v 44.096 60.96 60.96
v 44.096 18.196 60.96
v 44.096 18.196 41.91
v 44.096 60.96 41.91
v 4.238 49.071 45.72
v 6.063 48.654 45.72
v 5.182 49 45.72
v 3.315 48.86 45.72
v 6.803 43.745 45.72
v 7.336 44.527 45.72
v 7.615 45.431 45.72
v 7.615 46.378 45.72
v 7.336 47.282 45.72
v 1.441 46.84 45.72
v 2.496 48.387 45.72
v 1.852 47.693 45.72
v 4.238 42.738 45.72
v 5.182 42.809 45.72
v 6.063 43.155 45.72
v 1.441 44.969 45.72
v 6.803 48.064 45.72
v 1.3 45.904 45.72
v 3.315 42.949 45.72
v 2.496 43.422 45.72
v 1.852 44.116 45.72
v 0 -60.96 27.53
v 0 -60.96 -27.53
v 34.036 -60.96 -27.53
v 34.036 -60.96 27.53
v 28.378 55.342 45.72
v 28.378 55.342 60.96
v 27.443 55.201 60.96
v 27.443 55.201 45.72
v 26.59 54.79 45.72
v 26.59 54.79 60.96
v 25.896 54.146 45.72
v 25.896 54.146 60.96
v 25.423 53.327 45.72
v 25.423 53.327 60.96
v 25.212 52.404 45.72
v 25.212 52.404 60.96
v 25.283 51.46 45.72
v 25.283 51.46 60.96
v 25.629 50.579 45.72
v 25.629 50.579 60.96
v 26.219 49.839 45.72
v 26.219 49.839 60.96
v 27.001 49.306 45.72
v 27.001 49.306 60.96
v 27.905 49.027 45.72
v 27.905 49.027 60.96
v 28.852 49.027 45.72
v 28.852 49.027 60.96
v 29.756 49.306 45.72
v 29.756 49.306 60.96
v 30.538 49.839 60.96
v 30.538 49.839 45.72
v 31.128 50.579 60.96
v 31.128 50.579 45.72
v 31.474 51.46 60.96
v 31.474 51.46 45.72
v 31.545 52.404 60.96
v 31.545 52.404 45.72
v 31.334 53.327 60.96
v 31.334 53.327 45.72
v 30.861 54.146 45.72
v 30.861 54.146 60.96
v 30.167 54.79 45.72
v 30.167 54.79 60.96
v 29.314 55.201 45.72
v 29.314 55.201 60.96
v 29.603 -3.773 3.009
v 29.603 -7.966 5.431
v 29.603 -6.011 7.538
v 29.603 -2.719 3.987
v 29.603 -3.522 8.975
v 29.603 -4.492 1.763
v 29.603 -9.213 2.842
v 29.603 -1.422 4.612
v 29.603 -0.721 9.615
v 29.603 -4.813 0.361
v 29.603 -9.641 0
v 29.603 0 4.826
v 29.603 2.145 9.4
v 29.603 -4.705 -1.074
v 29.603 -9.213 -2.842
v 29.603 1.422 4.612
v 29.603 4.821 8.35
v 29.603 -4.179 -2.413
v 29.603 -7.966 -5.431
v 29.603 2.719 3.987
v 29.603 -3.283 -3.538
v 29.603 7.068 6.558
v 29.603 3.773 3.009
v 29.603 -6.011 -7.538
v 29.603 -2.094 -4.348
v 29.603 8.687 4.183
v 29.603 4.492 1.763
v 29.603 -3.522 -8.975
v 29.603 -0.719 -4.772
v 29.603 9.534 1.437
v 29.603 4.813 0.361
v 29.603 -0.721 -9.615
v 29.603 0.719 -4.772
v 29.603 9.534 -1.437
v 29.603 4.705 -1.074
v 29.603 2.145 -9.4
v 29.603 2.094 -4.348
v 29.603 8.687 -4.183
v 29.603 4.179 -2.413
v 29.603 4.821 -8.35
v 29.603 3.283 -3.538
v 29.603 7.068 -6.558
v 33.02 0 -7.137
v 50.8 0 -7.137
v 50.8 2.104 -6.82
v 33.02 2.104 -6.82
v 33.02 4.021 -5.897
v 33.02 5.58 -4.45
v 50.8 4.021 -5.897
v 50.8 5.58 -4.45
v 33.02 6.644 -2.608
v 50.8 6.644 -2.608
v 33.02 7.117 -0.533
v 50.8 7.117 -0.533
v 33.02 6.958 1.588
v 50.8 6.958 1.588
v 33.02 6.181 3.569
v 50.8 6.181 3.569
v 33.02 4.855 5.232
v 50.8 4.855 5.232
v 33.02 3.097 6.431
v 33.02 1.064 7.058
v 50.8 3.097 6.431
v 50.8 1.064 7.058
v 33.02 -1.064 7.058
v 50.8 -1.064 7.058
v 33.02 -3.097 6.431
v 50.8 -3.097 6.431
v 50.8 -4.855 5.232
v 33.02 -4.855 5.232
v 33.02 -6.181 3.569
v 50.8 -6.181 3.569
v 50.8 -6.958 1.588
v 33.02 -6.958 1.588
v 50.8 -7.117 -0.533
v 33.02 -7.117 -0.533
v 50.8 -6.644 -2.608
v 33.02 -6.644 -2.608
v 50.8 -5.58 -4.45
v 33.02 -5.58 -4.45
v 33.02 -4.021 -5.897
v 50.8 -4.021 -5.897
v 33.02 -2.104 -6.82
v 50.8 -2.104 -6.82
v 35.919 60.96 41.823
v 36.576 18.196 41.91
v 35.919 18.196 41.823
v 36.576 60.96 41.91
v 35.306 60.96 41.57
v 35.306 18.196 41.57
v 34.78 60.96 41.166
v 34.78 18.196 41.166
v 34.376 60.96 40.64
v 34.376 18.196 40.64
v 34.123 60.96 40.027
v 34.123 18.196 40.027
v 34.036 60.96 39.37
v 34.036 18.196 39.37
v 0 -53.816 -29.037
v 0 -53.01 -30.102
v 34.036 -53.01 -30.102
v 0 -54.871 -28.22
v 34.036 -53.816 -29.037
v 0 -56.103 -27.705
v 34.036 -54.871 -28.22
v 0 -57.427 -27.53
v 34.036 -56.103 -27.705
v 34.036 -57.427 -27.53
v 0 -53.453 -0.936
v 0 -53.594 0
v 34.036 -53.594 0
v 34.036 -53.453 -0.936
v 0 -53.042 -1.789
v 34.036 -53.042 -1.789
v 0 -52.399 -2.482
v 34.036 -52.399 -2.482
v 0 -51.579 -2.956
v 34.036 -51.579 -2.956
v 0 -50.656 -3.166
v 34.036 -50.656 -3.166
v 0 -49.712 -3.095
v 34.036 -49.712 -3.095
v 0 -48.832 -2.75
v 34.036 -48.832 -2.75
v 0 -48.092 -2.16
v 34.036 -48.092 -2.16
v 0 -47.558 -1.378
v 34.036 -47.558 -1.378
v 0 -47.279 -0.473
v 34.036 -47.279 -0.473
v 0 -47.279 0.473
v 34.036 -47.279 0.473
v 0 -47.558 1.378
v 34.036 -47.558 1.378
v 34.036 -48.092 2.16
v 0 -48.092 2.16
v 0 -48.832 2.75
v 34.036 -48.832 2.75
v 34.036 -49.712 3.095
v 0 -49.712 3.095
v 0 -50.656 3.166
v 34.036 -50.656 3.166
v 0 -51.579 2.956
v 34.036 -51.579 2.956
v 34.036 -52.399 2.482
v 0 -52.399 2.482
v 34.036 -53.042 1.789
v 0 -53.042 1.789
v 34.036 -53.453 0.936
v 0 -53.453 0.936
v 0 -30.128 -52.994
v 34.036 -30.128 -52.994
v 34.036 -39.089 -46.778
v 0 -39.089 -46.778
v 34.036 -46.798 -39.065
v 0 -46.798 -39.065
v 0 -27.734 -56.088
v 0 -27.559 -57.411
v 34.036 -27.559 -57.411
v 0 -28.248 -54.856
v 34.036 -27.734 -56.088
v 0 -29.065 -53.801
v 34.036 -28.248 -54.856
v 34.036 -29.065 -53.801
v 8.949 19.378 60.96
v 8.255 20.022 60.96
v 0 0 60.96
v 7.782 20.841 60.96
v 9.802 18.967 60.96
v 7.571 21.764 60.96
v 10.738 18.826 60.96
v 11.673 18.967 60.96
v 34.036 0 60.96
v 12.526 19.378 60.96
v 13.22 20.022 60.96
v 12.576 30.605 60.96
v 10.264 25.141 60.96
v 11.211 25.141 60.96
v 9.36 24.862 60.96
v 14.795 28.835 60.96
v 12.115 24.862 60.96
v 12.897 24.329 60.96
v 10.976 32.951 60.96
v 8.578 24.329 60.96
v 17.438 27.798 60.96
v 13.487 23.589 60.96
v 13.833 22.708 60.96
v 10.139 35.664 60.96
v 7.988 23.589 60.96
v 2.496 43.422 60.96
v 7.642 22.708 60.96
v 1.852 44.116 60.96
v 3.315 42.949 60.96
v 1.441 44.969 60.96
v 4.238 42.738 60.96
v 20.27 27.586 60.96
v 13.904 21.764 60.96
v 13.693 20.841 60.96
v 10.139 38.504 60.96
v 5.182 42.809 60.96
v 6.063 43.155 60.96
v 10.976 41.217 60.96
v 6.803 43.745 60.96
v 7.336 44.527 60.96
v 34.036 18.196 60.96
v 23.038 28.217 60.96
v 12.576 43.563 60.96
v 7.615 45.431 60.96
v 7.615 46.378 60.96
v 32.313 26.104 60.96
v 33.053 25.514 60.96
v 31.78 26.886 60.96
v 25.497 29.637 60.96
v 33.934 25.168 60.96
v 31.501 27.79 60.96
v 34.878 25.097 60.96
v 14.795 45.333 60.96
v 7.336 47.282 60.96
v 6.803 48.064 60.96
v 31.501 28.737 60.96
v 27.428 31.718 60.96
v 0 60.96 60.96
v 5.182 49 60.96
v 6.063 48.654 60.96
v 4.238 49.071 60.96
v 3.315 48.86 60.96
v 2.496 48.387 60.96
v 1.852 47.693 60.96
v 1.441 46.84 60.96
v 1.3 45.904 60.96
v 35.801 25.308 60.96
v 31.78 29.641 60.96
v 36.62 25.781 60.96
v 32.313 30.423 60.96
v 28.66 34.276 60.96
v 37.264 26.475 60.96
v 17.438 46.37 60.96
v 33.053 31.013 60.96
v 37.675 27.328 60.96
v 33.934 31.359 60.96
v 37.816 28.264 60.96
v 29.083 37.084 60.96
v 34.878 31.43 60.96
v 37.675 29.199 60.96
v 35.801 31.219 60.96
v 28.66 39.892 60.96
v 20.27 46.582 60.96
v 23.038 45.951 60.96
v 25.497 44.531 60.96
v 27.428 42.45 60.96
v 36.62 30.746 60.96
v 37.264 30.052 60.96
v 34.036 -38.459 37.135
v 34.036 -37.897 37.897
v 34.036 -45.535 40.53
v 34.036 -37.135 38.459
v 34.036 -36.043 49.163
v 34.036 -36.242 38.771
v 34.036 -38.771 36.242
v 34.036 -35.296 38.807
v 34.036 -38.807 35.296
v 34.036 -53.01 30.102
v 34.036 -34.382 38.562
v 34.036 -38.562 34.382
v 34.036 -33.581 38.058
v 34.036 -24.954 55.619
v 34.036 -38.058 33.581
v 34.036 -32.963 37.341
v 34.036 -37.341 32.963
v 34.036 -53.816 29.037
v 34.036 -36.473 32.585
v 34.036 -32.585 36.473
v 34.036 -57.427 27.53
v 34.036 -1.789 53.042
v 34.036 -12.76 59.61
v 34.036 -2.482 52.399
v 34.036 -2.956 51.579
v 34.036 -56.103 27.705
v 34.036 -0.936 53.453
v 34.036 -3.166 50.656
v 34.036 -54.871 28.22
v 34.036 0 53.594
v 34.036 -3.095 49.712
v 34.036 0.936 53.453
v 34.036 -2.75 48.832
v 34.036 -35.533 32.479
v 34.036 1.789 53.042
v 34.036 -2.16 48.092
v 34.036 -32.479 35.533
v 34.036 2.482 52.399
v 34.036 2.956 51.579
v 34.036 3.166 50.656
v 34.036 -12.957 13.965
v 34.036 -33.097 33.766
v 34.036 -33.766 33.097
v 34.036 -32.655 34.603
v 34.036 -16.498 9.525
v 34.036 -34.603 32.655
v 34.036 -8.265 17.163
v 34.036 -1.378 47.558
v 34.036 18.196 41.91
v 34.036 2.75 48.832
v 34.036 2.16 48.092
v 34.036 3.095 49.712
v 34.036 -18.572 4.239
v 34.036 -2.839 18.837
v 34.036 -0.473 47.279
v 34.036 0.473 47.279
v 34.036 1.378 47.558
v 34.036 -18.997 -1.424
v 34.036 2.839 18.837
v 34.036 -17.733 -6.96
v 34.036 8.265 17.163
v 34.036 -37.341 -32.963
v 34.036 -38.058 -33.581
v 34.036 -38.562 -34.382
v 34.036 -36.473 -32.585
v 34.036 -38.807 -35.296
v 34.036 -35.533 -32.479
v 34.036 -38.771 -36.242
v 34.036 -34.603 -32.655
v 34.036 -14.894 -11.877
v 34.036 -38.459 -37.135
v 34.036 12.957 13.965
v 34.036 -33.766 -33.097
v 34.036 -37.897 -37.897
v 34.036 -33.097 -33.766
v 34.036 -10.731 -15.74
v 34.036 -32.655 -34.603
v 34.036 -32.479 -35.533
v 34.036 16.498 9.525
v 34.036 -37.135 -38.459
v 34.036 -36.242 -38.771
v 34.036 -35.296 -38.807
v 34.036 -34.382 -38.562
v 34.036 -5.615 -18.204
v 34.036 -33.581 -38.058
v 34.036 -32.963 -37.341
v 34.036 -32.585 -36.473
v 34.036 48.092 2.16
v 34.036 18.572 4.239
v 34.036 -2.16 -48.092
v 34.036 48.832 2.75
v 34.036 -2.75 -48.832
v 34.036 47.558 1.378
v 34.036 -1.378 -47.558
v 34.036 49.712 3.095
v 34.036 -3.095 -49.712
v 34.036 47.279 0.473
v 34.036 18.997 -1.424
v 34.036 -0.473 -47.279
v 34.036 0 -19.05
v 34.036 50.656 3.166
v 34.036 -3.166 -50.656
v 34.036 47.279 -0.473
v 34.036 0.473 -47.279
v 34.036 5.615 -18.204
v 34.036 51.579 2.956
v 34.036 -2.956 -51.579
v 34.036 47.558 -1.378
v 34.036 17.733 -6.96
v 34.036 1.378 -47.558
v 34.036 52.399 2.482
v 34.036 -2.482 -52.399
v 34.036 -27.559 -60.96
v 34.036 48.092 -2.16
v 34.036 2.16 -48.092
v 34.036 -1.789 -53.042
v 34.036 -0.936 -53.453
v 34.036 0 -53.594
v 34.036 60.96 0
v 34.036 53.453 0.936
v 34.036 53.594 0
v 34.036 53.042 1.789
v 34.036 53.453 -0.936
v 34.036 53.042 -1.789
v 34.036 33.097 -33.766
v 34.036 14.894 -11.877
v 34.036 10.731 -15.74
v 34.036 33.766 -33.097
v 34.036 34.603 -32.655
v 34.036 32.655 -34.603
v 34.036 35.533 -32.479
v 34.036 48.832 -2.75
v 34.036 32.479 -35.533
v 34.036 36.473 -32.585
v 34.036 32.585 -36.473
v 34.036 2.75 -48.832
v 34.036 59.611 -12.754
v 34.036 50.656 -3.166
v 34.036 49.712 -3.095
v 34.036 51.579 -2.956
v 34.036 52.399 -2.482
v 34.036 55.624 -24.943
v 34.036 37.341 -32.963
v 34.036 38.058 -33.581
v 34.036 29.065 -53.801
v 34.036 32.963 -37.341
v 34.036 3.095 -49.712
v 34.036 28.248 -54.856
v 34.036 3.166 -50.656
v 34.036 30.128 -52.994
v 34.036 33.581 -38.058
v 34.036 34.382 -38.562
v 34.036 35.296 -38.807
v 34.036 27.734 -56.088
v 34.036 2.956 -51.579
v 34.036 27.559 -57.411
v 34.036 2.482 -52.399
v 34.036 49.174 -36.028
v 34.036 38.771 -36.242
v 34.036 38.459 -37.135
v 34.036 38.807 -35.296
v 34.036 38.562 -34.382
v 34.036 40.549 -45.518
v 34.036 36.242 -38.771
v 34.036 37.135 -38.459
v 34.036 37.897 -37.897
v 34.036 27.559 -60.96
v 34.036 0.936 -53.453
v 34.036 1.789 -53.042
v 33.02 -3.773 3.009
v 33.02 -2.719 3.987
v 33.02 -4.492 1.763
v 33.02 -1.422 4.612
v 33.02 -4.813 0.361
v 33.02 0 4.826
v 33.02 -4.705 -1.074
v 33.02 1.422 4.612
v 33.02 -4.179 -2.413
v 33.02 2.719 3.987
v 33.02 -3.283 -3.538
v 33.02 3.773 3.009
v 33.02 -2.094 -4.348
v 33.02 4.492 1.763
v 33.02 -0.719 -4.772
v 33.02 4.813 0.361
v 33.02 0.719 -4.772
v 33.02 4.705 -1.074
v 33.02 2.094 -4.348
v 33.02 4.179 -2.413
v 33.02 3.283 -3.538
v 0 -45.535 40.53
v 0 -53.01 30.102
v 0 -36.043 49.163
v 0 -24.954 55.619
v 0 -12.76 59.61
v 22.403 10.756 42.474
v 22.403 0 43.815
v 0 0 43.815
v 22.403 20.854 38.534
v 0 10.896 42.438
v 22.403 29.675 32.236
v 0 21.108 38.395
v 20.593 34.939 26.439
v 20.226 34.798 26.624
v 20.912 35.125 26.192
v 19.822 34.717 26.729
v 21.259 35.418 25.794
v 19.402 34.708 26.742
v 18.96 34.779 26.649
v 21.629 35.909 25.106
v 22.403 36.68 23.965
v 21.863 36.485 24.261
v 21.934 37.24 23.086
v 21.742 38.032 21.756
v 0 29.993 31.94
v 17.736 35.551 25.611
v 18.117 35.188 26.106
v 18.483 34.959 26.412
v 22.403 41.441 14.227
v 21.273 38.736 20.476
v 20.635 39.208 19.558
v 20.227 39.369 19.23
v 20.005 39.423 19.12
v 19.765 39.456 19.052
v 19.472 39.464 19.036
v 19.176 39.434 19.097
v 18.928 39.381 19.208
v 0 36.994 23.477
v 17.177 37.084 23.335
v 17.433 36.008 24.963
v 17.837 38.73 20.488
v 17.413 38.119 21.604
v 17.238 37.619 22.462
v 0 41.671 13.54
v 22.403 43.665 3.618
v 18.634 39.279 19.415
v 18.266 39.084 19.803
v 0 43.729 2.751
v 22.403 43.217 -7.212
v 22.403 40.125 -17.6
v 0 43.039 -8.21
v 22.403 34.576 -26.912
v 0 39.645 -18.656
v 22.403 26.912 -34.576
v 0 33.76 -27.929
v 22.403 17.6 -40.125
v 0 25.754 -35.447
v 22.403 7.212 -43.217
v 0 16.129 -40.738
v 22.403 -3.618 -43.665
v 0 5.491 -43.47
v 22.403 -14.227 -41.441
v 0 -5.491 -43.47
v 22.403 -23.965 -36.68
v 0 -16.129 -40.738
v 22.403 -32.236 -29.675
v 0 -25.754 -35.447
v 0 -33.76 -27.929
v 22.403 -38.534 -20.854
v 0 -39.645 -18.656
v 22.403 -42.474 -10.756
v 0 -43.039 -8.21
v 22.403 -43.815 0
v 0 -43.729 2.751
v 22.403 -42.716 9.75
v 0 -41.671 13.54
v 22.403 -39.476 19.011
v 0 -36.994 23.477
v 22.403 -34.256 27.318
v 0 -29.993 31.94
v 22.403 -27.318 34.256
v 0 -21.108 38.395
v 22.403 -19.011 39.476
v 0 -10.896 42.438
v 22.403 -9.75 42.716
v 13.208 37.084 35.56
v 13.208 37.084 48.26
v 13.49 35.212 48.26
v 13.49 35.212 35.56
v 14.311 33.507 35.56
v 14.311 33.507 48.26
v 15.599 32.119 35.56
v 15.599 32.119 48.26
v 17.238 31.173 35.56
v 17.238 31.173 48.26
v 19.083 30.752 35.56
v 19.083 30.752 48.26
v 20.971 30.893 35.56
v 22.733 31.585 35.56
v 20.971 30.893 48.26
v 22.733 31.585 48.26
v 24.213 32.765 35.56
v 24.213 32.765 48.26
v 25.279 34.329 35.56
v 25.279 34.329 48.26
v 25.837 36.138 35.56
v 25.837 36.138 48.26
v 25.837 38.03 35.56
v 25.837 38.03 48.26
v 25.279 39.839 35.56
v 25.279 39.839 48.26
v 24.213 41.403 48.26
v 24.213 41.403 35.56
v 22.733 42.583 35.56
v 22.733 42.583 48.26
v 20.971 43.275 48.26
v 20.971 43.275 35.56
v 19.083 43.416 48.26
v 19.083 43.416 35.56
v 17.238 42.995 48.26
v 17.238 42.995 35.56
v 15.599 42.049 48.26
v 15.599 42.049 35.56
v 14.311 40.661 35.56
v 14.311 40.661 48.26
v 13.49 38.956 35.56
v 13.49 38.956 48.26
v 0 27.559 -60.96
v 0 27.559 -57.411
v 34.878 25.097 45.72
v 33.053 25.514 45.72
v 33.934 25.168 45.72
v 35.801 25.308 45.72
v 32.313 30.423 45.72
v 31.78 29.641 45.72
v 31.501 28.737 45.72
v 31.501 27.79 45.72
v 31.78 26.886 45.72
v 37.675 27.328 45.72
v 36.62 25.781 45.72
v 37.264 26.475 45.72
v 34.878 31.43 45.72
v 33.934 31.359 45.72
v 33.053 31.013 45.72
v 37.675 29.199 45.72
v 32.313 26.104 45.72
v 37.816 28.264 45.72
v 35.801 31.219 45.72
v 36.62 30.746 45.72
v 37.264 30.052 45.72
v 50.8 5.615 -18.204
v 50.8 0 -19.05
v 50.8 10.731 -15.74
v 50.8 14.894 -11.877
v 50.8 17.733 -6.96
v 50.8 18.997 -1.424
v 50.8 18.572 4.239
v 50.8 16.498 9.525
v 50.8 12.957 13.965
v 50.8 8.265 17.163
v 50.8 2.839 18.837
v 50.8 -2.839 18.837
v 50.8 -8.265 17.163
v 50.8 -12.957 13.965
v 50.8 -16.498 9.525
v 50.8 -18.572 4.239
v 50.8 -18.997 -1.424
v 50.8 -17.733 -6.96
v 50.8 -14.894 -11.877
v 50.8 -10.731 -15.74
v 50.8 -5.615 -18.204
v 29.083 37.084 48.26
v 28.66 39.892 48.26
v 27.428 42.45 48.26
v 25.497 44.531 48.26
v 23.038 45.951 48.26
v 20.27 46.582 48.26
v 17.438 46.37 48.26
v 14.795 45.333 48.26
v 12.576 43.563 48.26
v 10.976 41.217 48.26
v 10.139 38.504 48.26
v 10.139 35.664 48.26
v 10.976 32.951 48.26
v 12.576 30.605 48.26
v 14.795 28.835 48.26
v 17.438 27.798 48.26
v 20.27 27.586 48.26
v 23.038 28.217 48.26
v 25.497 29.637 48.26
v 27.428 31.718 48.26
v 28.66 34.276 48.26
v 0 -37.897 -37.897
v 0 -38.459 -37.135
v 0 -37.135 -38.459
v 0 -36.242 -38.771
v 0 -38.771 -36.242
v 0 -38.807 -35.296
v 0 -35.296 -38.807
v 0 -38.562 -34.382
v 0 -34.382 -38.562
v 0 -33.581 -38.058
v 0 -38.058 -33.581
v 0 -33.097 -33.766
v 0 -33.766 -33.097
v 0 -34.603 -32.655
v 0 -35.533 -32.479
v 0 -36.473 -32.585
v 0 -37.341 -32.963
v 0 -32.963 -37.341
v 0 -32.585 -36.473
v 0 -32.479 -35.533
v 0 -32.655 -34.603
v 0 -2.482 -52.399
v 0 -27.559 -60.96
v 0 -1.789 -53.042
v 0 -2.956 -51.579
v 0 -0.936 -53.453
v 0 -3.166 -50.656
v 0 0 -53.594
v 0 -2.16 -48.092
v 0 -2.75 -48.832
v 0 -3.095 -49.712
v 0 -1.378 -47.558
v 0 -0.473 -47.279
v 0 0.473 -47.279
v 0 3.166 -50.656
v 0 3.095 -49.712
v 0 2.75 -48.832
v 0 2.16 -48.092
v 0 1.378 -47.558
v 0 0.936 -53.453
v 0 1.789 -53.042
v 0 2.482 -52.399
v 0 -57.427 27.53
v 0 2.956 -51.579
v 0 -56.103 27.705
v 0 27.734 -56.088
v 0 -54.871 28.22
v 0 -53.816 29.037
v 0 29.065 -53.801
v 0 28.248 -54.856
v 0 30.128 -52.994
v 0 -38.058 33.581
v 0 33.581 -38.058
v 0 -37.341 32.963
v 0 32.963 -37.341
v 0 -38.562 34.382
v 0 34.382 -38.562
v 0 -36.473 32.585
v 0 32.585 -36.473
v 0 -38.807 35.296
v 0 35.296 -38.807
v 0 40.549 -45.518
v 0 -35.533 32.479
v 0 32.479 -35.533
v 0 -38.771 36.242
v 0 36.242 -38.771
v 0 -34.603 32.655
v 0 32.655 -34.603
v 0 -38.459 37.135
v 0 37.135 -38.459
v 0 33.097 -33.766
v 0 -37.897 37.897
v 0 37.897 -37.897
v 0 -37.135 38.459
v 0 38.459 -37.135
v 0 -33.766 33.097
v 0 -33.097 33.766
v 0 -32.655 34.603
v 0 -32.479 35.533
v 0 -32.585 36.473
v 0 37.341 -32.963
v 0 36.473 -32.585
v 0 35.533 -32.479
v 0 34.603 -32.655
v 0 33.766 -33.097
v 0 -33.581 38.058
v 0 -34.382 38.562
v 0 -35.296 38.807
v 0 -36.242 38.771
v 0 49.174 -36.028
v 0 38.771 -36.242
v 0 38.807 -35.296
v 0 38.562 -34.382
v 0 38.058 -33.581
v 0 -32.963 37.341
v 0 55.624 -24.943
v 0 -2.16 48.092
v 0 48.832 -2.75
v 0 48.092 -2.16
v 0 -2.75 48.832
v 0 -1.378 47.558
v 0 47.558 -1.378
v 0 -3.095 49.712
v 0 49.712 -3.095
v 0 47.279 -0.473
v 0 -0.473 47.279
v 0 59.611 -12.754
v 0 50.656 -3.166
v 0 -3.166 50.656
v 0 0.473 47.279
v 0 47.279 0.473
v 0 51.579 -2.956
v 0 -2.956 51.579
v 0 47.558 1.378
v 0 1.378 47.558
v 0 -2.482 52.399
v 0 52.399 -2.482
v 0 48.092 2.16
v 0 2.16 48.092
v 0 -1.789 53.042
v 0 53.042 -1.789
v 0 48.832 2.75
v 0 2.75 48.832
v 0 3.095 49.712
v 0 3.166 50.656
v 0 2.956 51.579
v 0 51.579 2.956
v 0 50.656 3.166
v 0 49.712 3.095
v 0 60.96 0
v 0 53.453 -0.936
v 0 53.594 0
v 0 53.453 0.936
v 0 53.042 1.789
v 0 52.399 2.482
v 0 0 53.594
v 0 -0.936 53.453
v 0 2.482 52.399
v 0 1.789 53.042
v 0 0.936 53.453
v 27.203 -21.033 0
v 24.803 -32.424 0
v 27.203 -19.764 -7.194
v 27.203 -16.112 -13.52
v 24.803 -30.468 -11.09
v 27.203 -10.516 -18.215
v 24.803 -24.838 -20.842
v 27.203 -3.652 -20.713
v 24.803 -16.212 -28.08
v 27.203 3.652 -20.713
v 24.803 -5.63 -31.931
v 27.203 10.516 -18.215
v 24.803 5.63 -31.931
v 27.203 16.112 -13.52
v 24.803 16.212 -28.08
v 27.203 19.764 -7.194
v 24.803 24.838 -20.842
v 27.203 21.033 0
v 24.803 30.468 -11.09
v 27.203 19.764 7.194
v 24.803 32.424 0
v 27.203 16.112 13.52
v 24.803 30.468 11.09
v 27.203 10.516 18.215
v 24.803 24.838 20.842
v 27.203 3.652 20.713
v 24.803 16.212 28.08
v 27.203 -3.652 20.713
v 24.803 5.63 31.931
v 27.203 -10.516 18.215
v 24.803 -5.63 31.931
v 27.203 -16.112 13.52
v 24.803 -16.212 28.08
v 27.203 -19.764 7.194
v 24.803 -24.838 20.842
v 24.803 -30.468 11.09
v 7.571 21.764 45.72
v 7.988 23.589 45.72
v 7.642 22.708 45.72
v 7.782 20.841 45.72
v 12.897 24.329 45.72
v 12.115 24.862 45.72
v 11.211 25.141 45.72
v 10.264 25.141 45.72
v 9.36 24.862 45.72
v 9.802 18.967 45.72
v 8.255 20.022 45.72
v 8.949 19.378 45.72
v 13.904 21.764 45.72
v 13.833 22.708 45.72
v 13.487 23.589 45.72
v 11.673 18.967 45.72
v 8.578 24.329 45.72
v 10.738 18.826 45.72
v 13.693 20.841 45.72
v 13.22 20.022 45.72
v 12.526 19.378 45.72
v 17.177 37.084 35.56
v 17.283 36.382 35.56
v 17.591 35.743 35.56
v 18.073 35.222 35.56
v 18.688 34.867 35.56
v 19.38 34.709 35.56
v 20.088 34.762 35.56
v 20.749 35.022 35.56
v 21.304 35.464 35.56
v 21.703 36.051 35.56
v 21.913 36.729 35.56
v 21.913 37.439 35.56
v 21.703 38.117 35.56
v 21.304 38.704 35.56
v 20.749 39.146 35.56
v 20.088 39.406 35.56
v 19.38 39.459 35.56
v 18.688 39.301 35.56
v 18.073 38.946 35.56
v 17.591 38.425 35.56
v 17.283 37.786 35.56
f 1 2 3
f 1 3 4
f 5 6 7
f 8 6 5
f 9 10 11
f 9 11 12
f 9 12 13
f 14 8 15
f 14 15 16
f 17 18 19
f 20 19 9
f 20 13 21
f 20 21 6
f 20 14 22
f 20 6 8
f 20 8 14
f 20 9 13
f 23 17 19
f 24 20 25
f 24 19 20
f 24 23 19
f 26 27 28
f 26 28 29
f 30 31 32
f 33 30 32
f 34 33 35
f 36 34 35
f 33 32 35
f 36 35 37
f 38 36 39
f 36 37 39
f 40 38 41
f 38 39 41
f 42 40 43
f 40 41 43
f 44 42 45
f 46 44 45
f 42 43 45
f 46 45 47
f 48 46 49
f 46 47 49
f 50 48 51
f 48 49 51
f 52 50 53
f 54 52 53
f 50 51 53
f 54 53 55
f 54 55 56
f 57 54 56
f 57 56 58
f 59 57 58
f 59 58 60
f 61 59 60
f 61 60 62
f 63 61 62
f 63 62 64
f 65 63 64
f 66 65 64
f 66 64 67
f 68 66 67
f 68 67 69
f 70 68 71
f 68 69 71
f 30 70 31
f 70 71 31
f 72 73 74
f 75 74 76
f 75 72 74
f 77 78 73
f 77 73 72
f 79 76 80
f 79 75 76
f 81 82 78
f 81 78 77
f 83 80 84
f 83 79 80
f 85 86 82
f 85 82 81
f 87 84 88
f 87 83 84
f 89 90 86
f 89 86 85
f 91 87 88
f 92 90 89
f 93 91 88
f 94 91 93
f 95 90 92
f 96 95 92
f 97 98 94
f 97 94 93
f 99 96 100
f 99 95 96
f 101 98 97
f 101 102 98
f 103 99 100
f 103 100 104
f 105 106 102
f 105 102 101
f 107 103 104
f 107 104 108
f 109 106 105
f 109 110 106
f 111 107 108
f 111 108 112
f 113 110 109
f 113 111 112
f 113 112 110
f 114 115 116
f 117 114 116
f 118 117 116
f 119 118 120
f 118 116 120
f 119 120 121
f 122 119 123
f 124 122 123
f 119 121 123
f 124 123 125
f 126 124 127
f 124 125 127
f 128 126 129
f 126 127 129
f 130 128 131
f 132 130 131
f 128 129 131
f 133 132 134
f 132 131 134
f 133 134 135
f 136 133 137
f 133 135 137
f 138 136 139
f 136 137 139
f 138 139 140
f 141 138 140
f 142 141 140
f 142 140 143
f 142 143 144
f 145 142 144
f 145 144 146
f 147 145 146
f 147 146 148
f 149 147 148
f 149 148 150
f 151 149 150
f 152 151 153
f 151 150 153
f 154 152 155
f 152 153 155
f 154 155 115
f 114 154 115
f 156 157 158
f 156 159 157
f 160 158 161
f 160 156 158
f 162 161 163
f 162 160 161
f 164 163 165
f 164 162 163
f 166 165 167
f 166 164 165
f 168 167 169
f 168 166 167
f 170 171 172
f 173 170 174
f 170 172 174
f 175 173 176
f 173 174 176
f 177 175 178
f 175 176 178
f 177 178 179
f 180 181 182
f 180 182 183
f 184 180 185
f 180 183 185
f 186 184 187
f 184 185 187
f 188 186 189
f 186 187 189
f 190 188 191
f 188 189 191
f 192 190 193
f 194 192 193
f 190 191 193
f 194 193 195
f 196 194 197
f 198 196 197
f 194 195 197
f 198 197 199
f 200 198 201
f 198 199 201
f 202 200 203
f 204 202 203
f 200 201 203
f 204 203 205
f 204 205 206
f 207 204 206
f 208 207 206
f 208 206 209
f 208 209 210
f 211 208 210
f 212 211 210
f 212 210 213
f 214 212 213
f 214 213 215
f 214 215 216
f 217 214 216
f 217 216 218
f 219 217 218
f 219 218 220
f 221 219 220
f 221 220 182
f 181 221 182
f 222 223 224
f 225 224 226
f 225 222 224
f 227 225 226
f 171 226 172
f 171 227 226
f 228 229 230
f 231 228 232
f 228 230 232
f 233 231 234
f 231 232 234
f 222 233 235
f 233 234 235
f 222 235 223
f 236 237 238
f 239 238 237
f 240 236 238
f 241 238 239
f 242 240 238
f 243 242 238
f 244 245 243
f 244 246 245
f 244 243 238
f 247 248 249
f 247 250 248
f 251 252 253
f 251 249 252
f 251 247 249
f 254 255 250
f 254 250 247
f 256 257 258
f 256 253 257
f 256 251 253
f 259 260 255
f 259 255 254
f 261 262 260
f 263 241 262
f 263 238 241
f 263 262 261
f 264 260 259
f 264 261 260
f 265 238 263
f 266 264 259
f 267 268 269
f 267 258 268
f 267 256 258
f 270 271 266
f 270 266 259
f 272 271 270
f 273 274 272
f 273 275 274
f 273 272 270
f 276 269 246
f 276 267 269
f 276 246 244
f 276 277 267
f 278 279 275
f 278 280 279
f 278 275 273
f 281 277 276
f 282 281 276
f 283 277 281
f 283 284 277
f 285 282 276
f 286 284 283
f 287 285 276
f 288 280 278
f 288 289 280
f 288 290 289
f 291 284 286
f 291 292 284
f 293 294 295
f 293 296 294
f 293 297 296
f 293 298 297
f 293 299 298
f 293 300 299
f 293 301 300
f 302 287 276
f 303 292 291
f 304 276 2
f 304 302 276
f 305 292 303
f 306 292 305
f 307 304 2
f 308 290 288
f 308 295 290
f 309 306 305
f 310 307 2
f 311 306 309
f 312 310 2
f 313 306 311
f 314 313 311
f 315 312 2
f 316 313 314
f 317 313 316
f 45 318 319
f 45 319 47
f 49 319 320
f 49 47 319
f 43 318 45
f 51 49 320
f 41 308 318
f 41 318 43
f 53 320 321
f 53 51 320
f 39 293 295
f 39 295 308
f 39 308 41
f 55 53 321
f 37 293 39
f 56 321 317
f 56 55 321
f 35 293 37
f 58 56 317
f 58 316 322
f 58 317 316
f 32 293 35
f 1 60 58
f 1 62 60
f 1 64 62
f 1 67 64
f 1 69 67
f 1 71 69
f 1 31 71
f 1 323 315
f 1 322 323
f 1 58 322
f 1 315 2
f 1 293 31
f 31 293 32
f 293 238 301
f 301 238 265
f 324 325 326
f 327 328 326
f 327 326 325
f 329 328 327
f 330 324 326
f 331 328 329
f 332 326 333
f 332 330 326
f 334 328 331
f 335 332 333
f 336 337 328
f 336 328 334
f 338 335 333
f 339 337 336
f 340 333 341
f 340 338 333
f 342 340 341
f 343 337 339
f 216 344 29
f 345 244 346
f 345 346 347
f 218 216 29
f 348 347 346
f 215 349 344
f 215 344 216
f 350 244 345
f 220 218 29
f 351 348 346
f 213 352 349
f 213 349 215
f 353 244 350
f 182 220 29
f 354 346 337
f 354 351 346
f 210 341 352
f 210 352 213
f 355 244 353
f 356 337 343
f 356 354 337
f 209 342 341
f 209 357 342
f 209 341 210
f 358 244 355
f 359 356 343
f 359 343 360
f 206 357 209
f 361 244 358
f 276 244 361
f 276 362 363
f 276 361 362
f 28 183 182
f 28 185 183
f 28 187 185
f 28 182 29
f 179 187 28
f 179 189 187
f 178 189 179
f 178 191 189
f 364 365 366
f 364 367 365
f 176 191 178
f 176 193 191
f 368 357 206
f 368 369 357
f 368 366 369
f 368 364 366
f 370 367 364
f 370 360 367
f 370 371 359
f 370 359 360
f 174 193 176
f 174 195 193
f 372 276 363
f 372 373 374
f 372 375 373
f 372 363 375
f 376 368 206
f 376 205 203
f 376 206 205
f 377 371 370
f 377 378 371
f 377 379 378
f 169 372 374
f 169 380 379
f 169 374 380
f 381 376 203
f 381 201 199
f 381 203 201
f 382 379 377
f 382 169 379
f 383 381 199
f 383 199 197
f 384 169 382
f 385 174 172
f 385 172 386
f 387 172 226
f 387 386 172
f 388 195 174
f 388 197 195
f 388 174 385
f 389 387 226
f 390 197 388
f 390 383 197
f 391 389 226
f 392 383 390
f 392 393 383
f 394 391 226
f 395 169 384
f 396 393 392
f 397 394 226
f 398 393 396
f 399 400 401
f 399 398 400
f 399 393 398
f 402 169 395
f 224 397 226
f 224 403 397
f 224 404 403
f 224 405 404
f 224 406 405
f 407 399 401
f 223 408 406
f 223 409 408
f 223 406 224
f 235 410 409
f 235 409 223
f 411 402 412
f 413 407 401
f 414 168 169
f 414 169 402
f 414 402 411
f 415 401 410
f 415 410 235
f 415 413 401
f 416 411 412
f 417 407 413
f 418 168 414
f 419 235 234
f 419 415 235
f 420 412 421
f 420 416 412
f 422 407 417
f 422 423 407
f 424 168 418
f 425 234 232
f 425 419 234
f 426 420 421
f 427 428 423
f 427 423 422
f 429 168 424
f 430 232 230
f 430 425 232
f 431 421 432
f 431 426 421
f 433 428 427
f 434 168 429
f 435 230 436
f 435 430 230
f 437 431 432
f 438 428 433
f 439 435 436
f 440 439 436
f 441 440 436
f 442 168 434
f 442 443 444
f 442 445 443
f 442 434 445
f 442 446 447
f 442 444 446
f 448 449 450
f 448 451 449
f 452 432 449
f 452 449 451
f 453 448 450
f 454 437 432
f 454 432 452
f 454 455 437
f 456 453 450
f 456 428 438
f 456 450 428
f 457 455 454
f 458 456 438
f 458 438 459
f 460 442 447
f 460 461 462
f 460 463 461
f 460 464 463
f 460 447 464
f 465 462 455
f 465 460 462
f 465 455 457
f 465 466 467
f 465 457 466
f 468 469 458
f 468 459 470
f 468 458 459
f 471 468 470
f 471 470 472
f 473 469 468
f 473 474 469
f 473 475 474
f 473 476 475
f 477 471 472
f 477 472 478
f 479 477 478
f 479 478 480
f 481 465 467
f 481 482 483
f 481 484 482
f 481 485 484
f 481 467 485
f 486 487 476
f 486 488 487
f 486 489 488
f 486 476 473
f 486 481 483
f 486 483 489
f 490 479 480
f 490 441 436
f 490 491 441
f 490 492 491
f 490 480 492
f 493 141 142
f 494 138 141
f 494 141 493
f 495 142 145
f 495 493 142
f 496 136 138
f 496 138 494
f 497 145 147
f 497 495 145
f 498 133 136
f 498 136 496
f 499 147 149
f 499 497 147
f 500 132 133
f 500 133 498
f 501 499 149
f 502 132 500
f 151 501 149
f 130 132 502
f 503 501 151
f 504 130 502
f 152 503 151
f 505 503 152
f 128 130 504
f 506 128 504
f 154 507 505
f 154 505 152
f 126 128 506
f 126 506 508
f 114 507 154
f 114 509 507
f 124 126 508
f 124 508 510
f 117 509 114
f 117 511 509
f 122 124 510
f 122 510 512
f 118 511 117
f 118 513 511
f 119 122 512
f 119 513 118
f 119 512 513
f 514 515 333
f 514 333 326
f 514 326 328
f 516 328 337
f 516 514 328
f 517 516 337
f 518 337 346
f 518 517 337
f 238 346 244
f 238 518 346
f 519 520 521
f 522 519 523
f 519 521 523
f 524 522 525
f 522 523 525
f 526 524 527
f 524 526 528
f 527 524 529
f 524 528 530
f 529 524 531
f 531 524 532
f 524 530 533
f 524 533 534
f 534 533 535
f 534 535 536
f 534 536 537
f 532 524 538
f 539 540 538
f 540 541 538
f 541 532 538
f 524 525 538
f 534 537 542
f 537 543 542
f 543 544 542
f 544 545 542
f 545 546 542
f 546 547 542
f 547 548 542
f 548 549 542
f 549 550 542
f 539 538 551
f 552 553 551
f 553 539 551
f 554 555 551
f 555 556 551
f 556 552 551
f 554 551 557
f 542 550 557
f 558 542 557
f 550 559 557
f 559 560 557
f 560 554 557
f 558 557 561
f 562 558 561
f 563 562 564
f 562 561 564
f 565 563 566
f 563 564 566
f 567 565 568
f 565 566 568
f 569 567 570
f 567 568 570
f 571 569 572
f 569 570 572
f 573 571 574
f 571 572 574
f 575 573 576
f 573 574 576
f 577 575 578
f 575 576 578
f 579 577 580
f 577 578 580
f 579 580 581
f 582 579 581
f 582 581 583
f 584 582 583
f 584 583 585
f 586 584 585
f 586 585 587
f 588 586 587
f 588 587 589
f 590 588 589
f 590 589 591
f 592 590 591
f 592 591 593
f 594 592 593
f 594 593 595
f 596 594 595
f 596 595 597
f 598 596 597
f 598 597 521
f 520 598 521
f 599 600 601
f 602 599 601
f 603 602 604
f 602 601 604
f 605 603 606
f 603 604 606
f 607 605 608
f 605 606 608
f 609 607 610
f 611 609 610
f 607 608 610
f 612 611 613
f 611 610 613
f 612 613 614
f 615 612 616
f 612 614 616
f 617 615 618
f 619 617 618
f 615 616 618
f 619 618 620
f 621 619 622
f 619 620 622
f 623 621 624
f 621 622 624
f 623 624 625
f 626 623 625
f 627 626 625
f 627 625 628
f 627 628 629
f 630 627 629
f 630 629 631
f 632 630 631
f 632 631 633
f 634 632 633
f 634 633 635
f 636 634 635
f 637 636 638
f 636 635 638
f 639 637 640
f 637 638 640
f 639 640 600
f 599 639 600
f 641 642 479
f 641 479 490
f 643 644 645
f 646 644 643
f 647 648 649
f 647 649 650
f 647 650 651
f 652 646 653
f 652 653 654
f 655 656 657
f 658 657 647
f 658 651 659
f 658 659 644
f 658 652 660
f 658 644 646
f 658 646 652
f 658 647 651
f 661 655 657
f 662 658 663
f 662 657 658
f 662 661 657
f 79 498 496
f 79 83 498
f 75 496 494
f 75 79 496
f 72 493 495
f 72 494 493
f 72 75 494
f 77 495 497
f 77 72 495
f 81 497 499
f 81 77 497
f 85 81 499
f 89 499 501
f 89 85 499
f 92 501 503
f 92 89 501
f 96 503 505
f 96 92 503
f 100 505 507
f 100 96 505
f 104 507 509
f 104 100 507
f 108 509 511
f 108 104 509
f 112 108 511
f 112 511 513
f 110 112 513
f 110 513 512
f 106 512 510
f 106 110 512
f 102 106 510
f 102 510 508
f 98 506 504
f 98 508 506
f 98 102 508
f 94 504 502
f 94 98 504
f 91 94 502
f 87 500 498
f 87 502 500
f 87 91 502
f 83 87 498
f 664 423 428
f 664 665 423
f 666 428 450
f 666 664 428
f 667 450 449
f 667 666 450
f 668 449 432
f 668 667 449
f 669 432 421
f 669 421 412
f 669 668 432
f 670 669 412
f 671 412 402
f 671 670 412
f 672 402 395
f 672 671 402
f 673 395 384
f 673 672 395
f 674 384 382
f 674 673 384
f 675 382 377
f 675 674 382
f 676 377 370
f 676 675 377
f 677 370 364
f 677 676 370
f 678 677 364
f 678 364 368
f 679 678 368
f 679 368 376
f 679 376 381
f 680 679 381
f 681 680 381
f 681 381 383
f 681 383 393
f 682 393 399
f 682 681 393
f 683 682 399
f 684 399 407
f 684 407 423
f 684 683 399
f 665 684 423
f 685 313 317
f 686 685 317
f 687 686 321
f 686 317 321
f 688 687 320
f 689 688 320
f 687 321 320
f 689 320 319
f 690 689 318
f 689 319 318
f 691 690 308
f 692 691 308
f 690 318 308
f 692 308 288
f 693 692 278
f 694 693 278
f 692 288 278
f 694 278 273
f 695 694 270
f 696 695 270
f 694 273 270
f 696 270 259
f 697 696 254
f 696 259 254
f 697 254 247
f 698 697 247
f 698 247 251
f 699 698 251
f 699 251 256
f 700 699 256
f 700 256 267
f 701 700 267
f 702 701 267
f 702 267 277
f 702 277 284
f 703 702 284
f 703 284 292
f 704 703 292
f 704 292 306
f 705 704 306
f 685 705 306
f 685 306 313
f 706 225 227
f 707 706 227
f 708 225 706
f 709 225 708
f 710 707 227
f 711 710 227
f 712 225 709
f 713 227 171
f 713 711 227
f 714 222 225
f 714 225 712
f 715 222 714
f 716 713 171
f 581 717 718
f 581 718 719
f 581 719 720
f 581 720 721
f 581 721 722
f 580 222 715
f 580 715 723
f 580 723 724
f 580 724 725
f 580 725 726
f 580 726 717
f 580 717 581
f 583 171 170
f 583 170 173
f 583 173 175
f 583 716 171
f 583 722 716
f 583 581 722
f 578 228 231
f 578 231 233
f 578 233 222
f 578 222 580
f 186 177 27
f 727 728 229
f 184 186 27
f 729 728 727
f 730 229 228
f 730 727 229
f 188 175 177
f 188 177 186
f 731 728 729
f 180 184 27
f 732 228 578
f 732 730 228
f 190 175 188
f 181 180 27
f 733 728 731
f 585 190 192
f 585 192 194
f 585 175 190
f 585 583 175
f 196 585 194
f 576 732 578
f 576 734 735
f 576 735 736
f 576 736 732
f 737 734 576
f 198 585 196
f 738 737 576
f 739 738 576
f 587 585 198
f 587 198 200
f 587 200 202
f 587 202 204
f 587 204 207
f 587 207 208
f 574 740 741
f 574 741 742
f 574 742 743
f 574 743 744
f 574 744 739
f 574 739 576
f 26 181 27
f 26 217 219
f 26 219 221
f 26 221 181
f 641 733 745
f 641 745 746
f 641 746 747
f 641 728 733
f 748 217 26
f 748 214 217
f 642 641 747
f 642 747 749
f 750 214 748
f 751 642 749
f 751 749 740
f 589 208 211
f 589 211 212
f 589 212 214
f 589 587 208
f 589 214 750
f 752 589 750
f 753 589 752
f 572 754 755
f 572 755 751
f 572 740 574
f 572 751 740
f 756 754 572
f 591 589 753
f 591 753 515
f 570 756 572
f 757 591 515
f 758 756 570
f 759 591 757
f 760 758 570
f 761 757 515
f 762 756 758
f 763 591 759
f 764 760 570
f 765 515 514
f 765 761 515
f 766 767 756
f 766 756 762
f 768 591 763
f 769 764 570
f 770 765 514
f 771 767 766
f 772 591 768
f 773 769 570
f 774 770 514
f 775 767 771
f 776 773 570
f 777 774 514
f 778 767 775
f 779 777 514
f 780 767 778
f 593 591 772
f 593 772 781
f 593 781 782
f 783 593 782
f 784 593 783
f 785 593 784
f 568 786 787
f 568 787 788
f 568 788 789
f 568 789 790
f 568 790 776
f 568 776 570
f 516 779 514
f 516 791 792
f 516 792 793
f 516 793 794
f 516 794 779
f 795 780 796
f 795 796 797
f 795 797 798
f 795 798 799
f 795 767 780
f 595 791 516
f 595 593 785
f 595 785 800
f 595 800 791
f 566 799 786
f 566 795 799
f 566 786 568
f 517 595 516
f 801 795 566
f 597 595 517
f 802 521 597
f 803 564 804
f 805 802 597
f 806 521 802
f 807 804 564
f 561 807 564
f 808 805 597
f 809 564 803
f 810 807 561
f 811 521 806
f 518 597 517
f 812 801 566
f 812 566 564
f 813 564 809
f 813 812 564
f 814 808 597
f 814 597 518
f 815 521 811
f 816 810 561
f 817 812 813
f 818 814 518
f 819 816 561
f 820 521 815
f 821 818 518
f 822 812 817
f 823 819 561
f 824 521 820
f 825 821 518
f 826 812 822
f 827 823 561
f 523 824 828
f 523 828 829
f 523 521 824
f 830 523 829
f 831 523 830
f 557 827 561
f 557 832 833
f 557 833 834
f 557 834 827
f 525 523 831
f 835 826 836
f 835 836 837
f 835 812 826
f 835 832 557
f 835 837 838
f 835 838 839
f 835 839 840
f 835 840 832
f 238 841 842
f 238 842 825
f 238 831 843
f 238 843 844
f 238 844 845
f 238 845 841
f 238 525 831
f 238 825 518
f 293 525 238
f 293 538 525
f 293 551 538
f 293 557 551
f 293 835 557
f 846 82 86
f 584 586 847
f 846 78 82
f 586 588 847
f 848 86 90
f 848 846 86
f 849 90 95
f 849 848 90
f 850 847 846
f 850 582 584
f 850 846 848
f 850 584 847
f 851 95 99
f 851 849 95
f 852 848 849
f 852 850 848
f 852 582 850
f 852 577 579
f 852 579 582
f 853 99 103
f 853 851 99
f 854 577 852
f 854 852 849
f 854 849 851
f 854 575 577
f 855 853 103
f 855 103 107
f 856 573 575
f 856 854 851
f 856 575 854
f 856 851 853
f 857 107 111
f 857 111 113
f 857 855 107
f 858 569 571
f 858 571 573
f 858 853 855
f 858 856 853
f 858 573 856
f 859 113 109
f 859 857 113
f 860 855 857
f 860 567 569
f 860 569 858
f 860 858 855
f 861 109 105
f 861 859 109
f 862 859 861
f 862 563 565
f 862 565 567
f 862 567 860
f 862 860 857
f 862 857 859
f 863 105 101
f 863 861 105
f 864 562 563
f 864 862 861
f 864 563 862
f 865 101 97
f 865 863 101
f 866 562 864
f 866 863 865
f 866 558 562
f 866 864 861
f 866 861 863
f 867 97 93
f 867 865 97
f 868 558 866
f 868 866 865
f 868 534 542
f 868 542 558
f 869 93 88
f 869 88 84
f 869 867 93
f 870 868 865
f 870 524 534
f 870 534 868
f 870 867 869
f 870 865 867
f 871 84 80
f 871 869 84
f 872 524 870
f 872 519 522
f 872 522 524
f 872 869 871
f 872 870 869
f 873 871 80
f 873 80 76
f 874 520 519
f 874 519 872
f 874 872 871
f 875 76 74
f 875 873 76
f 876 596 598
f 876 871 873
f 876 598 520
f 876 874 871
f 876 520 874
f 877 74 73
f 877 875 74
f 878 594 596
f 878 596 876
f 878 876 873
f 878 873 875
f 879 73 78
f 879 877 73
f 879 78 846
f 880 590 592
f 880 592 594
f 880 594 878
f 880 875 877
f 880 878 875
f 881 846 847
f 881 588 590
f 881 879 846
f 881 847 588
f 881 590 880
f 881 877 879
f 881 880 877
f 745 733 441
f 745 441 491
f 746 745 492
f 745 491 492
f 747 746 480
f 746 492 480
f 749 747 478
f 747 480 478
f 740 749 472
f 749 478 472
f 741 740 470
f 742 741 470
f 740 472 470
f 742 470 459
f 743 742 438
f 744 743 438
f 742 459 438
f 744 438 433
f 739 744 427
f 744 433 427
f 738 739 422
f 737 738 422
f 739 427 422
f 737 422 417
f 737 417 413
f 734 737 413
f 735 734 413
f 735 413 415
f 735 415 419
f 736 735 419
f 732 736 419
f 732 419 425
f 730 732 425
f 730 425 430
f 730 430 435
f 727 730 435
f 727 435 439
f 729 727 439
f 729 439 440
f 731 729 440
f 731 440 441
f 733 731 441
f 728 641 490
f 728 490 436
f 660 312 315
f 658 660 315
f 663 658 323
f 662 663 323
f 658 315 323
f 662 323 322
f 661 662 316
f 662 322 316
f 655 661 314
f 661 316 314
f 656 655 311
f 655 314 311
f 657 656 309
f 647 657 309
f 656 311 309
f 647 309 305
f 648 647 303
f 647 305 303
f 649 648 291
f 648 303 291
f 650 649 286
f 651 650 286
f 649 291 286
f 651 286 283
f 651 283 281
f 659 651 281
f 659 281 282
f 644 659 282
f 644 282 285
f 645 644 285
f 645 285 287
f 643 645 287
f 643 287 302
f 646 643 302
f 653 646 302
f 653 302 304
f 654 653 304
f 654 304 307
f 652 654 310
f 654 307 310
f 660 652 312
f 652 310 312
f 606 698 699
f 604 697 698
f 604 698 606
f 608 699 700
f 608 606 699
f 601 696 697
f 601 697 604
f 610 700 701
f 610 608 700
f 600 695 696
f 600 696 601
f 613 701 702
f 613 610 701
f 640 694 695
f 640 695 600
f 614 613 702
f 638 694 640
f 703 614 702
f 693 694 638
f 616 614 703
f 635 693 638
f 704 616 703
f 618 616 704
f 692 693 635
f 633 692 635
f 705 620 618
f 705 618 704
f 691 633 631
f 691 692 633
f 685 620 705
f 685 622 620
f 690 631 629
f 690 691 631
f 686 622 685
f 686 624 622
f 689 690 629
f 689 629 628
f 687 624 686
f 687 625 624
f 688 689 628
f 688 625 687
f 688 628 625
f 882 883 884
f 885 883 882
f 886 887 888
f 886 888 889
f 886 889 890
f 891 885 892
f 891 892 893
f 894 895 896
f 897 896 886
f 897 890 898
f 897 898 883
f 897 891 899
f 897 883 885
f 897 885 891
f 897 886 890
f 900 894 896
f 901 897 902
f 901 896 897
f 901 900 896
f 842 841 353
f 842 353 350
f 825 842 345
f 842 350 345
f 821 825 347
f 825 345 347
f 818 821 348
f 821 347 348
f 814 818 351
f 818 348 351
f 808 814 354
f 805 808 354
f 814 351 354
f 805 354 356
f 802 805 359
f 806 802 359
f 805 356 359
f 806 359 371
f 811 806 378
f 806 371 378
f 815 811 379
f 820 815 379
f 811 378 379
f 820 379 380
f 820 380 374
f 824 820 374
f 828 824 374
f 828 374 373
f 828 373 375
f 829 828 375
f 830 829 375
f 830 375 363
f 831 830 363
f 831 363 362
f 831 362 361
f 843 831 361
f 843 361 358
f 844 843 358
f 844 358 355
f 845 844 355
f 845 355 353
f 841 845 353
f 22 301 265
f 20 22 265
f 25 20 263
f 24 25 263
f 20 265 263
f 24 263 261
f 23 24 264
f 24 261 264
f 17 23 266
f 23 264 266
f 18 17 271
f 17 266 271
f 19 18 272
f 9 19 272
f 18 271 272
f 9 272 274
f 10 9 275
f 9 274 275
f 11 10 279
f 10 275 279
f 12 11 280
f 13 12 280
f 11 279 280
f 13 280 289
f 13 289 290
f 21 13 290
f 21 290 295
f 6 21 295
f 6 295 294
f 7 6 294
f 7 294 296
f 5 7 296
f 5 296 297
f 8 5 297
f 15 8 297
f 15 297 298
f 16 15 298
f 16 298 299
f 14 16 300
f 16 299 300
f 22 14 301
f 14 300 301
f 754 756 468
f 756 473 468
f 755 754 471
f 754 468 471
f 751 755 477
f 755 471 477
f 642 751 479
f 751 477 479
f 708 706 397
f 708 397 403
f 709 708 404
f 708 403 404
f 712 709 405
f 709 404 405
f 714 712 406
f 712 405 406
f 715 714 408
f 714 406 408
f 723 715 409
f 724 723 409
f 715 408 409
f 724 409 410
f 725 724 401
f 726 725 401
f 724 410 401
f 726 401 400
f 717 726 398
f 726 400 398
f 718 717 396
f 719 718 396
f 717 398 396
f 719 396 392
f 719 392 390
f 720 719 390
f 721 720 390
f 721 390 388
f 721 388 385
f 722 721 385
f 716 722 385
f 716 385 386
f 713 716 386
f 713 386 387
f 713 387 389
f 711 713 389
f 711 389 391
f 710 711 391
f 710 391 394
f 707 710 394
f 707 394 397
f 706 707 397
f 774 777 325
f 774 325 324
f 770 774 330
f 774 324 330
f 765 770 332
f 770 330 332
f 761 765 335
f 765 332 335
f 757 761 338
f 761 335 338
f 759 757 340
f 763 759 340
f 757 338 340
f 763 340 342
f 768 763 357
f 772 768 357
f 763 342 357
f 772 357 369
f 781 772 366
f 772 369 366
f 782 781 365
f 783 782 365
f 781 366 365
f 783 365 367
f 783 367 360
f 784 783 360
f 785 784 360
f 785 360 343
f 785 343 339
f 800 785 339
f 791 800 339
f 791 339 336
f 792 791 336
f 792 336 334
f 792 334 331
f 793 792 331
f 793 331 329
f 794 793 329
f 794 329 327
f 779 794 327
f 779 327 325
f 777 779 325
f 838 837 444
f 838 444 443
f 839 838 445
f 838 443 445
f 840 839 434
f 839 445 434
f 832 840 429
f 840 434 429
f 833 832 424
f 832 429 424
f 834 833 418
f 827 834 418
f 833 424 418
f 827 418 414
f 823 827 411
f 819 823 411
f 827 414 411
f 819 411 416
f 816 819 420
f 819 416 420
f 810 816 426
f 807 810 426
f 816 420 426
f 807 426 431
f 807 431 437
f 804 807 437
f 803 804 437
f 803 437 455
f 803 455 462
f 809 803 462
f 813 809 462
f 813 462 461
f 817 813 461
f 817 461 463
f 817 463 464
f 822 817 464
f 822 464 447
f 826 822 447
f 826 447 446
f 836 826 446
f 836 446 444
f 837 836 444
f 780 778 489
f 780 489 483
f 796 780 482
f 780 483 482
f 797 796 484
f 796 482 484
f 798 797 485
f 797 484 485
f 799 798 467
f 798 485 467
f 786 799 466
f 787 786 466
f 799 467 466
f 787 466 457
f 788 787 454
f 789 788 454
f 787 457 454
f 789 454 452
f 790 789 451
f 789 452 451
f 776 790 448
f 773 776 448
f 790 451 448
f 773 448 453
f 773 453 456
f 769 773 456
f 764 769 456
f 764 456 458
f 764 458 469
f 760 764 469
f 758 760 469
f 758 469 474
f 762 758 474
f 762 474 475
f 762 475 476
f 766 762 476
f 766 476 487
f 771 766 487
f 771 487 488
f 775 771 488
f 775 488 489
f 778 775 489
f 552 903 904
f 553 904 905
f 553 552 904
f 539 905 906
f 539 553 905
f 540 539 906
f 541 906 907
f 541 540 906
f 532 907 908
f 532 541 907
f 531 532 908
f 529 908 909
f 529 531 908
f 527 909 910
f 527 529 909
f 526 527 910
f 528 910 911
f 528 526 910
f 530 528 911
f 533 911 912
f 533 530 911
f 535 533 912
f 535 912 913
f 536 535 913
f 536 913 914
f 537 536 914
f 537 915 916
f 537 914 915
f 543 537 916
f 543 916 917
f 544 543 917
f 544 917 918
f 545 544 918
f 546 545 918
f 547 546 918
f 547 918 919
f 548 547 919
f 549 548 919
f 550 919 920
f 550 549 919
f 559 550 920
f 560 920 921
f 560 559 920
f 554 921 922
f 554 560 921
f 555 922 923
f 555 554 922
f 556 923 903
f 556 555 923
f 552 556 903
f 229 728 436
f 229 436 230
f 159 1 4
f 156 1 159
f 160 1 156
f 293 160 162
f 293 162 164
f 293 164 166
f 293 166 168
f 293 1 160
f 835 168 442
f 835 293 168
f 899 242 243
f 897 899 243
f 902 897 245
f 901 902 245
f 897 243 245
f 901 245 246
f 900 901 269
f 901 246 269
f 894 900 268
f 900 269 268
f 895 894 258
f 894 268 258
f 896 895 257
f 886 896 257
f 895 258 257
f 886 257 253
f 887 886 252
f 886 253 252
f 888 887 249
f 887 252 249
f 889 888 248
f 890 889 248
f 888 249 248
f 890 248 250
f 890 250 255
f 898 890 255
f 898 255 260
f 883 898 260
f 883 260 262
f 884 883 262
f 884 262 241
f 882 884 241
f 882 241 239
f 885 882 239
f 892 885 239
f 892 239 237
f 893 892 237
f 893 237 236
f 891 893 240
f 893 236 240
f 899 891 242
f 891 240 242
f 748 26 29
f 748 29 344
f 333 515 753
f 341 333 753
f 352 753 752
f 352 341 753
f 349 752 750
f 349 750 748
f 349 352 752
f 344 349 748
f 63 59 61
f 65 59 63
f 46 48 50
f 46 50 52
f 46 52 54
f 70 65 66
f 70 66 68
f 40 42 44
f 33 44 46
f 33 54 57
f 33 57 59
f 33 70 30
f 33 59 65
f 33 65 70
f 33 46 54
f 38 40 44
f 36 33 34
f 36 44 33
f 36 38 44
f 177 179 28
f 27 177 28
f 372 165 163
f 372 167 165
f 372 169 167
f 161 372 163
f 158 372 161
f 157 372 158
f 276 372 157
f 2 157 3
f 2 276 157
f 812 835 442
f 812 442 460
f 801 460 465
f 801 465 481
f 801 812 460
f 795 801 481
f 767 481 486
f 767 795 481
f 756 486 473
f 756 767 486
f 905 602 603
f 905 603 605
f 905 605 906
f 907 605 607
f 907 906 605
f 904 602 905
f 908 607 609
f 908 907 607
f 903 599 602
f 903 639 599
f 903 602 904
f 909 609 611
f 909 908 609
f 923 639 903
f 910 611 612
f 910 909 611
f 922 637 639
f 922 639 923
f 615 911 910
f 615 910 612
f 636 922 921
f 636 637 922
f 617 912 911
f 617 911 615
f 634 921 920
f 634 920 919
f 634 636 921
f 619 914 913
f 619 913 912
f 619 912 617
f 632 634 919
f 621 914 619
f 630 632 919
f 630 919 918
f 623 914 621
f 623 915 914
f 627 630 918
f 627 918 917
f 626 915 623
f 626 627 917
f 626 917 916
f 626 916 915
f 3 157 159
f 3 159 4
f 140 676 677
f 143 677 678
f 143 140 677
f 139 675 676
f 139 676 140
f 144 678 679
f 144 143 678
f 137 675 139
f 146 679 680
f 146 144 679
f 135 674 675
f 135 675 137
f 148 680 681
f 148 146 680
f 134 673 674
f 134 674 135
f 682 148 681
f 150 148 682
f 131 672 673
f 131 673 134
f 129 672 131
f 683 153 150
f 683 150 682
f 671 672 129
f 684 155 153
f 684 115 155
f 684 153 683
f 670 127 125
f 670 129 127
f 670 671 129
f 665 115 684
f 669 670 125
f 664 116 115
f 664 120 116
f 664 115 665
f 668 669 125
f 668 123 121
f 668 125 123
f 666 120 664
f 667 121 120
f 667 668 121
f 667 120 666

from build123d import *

# Parameters (mm, degrees)
HOUSING_2_DEPTH          = 44.45
SKETCH2_R                = 43.815
IMPELLER_CUT_DEPTH       = 22.4028
SKETCH4_R                = 4.826
INLET_CUT_DEPTH          = 19.8628
SKETCH6_R                = 3.175
FASTENER_BORE_DEPTH      = 116.84
FASTENER_PATTERN_COUNT   = 8
SKETCH7_R                = 100.114274451
SKETCH7_R_2              = 19.05
MASS_REDUCTION_CUT_DEPTH = 10.414
SKETCH11_R               = 19.05
SKETCH11_R_2             = 4.826
BOSS_EXTRUDE1_DEPTH      = 6.35
SKETCH14_R               = 2.38125
CUT_EXTRUDE3_DEPTH       = 99.06
SKETCH15_R               = 9.525
CUT_EXTRUDE4_DEPTH       = 25.4
BOSS_EXTRUDE2_START      = 12.7
SKETCH16_R               = 9.525
SKETCH16_R_2             = 6.35
BOSS_EXTRUDE2_DEPTH      = 12.7
SKETCH18_W               = 10.060456949
SKETCH18_H               = 42.763815868
BOSS_EXTRUDE3_DEPTH      = 19.05
FILLET7_R                = 2.54
SKETCH19_R               = 3.175
CUT_EXTRUDE5_DEPTH       = 15.24
FILLET9_R                = 5.08
SKETCH22_R               = 7.1374
CUT_EXTRUDE8_DEPTH       = 17.78
CIRPATTERN2_COUNT        = 4


with BuildPart() as part:
    # Sketch1 → Housing 2 (new body)
    with BuildSketch(Plane(origin=(0, 0, 0), x_dir=(0, 0, -1), z_dir=(1, 0, 0))):
        with BuildLine():
            Line((-60.96, 0), (-60.96, 60.96))
            Line((-60.96, 60.96), (0, 60.96))
            ThreePointArc((0, 60.96), (31.907091375, 51.942844743), (54.374839025, 27.559))
            Line((54.374839025, 27.559), (60.96, 27.559))
            Line((60.96, 27.559), (60.96, -27.559))
            Line((60.96, -27.559), (54.374839025, -27.559))
            ThreePointArc((54.374839025, -27.559), (43.093739421, -43.116716279), (27.530012063, -54.389521379))
            Line((27.530012063, -54.389521379), (27.530012063, -60.96))
            Line((27.530012063, -60.96), (-27.530012063, -60.96))
            Line((-27.530012063, -60.96), (-27.530012063, -54.389521379))
            ThreePointArc((-27.530012063, -54.389521379), (-51.934339003, -31.920934077), (-60.96, 0))
        make_face()
    extrude(amount=HOUSING_2_DEPTH)

    # Sketch2 → Impeller Cut (cut)
    with BuildSketch(Plane.ZY):
        Circle(SKETCH2_R)
    extrude(amount=-IMPELLER_CUT_DEPTH, mode=Mode.SUBTRACT)

    # Sketch3 → Impeller Angle Cut (revolve, cut)
    with BuildSketch(Plane.XY, mode=Mode.PRIVATE) as impeller_angle_cut_sk:
        Polygon((29.602825054, 9.641475923), (22.4028, 43.815), (22.225, 0), (29.602825054, 0), align=None)
    revolve(impeller_angle_cut_sk.sketch.rotate(Axis((22.225, 0, 0), (1, 0, 0)), 180), axis=Axis((22.225, 0, 0), (1, 0, 0)), mode=Mode.SUBTRACT)

    # Sketch4 → Inlet Cut (cut)
    with BuildSketch(Plane.ZY.offset(-29.602825054)):
        Circle(SKETCH4_R)
    extrude(amount=-INLET_CUT_DEPTH, mode=Mode.SUBTRACT)

    # Sketch6 → Fastener Bore (cut)
    with BuildSketch(Plane(origin=(44.45, 0, 0), x_dir=(0, 0, -1), z_dir=(1, 0, 0))):
        with Locations((50.419, 0)):
            Circle(SKETCH6_R)
    fastener_bore = extrude(amount=-FASTENER_BORE_DEPTH, mode=Mode.SUBTRACT)

    # Fastener Pattern: Fastener Bore ×8 about axis, 1 skipped
    fastener_pattern_axis = Axis((0, 0, 0), (-1, 0, 0))
    add([fastener_bore.rotate(fastener_pattern_axis, i * 360 / FASTENER_PATTERN_COUNT) for i in range(1, FASTENER_PATTERN_COUNT) if i not in (5,)], mode=Mode.SUBTRACT)

    # Sketch7 → Mass Reduction Cut (cut)
    with BuildSketch(Plane(origin=(44.45, 0, 0), x_dir=(0, 0, -1), z_dir=(1, 0, 0))):
        Circle(SKETCH7_R)
        Circle(SKETCH7_R_2, mode=Mode.SUBTRACT)
    extrude(amount=-MASS_REDUCTION_CUT_DEPTH, mode=Mode.SUBTRACT)

    # Sketch11 → Boss-Extrude1 (add)
    with BuildSketch(Plane(origin=(44.45, 0, 0), x_dir=(0, 0, -1), z_dir=(1, 0, 0))):
        Circle(SKETCH11_R)
        with Locations(Location((0, 0, 0), (0, 0, 180))):
            Circle(SKETCH11_R_2, mode=Mode.SUBTRACT)
    extrude(amount=BOSS_EXTRUDE1_DEPTH)

    # Sketch14 → Cut-Extrude3 (cut)
    with BuildSketch(Plane.XY):
        with Locations(Location((19.558, 37.084, 0), (0, 0, 180))):
            Circle(SKETCH14_R)
    extrude(amount=CUT_EXTRUDE3_DEPTH, mode=Mode.SUBTRACT)

    # Sketch15 → Cut-Extrude4 (cut)
    with BuildSketch(Plane.XY.offset(60.96)):
        with Locations((19.558, 37.084)):
            Circle(SKETCH15_R)
    extrude(amount=-CUT_EXTRUDE4_DEPTH, mode=Mode.SUBTRACT)

    # Sketch16 → Boss-Extrude2 (add)
    with BuildSketch(Plane.XY.offset(35.56).offset(BOSS_EXTRUDE2_START)):
        with Locations((19.558, 37.084)):
            Circle(SKETCH16_R)
        with Locations(Location((19.558, 37.084, 0), (0, 0, 180))):
            Circle(SKETCH16_R_2, mode=Mode.SUBTRACT)
    extrude(amount=-BOSS_EXTRUDE2_DEPTH)

    # Sketch18 → Boss-Extrude3 (add)
    with BuildSketch(Plane.XY.offset(60.96)):
        with Locations((39.066228475, 39.578092066)):
            Rectangle(SKETCH18_W, SKETCH18_H)
    extrude(amount=-BOSS_EXTRUDE3_DEPTH)

    # Fillet7
    fillet7_edges = [part.edges().sort_by_distance(p)[0] for p in [
        (34.036, 39.578092066, 41.91),
    ]]
    fillet(fillet7_edges, radius=FILLET7_R)

    # Sketch19 → Cut-Extrude5 (cut)
    with BuildSketch(Plane.XY.offset(60.96)):
        with Locations((34.640612035, 28.263568969)):
            Circle(SKETCH19_R)
    cut_extrude5 = extrude(amount=-CUT_EXTRUDE5_DEPTH, mode=Mode.SUBTRACT)

    # Fillet9
    fillet9_edges = [part.edges().sort_by_distance(p)[0] for p in [
        (17.018, 27.559, -54.374839025),
        (17.018, -27.559, -54.374839025),
        (17.018, -54.389521379, -27.530012063),
        (17.018, -54.389521379, 27.530012063),
    ]]
    fillet(fillet9_edges, radius=FILLET9_R)

    # Sketch22 → Cut-Extrude8 (cut)
    with BuildSketch(Plane(origin=(50.8, 0, 0), x_dir=(0, 0, -1), z_dir=(1, 0, 0))):
        Circle(SKETCH22_R)
    extrude(amount=-CUT_EXTRUDE8_DEPTH, mode=Mode.SUBTRACT)

    # CirPattern2: Cut-Extrude5 ×4 about axis
    cirpattern2_axis = Axis((19.558, 37.084, 0), (0, 0, 1))
    for i in range(1, CIRPATTERN2_COUNT):
        add(cut_extrude5.rotate(cirpattern2_axis, i * 360 / CIRPATTERN2_COUNT), mode=Mode.SUBTRACT)


solid = part.part
